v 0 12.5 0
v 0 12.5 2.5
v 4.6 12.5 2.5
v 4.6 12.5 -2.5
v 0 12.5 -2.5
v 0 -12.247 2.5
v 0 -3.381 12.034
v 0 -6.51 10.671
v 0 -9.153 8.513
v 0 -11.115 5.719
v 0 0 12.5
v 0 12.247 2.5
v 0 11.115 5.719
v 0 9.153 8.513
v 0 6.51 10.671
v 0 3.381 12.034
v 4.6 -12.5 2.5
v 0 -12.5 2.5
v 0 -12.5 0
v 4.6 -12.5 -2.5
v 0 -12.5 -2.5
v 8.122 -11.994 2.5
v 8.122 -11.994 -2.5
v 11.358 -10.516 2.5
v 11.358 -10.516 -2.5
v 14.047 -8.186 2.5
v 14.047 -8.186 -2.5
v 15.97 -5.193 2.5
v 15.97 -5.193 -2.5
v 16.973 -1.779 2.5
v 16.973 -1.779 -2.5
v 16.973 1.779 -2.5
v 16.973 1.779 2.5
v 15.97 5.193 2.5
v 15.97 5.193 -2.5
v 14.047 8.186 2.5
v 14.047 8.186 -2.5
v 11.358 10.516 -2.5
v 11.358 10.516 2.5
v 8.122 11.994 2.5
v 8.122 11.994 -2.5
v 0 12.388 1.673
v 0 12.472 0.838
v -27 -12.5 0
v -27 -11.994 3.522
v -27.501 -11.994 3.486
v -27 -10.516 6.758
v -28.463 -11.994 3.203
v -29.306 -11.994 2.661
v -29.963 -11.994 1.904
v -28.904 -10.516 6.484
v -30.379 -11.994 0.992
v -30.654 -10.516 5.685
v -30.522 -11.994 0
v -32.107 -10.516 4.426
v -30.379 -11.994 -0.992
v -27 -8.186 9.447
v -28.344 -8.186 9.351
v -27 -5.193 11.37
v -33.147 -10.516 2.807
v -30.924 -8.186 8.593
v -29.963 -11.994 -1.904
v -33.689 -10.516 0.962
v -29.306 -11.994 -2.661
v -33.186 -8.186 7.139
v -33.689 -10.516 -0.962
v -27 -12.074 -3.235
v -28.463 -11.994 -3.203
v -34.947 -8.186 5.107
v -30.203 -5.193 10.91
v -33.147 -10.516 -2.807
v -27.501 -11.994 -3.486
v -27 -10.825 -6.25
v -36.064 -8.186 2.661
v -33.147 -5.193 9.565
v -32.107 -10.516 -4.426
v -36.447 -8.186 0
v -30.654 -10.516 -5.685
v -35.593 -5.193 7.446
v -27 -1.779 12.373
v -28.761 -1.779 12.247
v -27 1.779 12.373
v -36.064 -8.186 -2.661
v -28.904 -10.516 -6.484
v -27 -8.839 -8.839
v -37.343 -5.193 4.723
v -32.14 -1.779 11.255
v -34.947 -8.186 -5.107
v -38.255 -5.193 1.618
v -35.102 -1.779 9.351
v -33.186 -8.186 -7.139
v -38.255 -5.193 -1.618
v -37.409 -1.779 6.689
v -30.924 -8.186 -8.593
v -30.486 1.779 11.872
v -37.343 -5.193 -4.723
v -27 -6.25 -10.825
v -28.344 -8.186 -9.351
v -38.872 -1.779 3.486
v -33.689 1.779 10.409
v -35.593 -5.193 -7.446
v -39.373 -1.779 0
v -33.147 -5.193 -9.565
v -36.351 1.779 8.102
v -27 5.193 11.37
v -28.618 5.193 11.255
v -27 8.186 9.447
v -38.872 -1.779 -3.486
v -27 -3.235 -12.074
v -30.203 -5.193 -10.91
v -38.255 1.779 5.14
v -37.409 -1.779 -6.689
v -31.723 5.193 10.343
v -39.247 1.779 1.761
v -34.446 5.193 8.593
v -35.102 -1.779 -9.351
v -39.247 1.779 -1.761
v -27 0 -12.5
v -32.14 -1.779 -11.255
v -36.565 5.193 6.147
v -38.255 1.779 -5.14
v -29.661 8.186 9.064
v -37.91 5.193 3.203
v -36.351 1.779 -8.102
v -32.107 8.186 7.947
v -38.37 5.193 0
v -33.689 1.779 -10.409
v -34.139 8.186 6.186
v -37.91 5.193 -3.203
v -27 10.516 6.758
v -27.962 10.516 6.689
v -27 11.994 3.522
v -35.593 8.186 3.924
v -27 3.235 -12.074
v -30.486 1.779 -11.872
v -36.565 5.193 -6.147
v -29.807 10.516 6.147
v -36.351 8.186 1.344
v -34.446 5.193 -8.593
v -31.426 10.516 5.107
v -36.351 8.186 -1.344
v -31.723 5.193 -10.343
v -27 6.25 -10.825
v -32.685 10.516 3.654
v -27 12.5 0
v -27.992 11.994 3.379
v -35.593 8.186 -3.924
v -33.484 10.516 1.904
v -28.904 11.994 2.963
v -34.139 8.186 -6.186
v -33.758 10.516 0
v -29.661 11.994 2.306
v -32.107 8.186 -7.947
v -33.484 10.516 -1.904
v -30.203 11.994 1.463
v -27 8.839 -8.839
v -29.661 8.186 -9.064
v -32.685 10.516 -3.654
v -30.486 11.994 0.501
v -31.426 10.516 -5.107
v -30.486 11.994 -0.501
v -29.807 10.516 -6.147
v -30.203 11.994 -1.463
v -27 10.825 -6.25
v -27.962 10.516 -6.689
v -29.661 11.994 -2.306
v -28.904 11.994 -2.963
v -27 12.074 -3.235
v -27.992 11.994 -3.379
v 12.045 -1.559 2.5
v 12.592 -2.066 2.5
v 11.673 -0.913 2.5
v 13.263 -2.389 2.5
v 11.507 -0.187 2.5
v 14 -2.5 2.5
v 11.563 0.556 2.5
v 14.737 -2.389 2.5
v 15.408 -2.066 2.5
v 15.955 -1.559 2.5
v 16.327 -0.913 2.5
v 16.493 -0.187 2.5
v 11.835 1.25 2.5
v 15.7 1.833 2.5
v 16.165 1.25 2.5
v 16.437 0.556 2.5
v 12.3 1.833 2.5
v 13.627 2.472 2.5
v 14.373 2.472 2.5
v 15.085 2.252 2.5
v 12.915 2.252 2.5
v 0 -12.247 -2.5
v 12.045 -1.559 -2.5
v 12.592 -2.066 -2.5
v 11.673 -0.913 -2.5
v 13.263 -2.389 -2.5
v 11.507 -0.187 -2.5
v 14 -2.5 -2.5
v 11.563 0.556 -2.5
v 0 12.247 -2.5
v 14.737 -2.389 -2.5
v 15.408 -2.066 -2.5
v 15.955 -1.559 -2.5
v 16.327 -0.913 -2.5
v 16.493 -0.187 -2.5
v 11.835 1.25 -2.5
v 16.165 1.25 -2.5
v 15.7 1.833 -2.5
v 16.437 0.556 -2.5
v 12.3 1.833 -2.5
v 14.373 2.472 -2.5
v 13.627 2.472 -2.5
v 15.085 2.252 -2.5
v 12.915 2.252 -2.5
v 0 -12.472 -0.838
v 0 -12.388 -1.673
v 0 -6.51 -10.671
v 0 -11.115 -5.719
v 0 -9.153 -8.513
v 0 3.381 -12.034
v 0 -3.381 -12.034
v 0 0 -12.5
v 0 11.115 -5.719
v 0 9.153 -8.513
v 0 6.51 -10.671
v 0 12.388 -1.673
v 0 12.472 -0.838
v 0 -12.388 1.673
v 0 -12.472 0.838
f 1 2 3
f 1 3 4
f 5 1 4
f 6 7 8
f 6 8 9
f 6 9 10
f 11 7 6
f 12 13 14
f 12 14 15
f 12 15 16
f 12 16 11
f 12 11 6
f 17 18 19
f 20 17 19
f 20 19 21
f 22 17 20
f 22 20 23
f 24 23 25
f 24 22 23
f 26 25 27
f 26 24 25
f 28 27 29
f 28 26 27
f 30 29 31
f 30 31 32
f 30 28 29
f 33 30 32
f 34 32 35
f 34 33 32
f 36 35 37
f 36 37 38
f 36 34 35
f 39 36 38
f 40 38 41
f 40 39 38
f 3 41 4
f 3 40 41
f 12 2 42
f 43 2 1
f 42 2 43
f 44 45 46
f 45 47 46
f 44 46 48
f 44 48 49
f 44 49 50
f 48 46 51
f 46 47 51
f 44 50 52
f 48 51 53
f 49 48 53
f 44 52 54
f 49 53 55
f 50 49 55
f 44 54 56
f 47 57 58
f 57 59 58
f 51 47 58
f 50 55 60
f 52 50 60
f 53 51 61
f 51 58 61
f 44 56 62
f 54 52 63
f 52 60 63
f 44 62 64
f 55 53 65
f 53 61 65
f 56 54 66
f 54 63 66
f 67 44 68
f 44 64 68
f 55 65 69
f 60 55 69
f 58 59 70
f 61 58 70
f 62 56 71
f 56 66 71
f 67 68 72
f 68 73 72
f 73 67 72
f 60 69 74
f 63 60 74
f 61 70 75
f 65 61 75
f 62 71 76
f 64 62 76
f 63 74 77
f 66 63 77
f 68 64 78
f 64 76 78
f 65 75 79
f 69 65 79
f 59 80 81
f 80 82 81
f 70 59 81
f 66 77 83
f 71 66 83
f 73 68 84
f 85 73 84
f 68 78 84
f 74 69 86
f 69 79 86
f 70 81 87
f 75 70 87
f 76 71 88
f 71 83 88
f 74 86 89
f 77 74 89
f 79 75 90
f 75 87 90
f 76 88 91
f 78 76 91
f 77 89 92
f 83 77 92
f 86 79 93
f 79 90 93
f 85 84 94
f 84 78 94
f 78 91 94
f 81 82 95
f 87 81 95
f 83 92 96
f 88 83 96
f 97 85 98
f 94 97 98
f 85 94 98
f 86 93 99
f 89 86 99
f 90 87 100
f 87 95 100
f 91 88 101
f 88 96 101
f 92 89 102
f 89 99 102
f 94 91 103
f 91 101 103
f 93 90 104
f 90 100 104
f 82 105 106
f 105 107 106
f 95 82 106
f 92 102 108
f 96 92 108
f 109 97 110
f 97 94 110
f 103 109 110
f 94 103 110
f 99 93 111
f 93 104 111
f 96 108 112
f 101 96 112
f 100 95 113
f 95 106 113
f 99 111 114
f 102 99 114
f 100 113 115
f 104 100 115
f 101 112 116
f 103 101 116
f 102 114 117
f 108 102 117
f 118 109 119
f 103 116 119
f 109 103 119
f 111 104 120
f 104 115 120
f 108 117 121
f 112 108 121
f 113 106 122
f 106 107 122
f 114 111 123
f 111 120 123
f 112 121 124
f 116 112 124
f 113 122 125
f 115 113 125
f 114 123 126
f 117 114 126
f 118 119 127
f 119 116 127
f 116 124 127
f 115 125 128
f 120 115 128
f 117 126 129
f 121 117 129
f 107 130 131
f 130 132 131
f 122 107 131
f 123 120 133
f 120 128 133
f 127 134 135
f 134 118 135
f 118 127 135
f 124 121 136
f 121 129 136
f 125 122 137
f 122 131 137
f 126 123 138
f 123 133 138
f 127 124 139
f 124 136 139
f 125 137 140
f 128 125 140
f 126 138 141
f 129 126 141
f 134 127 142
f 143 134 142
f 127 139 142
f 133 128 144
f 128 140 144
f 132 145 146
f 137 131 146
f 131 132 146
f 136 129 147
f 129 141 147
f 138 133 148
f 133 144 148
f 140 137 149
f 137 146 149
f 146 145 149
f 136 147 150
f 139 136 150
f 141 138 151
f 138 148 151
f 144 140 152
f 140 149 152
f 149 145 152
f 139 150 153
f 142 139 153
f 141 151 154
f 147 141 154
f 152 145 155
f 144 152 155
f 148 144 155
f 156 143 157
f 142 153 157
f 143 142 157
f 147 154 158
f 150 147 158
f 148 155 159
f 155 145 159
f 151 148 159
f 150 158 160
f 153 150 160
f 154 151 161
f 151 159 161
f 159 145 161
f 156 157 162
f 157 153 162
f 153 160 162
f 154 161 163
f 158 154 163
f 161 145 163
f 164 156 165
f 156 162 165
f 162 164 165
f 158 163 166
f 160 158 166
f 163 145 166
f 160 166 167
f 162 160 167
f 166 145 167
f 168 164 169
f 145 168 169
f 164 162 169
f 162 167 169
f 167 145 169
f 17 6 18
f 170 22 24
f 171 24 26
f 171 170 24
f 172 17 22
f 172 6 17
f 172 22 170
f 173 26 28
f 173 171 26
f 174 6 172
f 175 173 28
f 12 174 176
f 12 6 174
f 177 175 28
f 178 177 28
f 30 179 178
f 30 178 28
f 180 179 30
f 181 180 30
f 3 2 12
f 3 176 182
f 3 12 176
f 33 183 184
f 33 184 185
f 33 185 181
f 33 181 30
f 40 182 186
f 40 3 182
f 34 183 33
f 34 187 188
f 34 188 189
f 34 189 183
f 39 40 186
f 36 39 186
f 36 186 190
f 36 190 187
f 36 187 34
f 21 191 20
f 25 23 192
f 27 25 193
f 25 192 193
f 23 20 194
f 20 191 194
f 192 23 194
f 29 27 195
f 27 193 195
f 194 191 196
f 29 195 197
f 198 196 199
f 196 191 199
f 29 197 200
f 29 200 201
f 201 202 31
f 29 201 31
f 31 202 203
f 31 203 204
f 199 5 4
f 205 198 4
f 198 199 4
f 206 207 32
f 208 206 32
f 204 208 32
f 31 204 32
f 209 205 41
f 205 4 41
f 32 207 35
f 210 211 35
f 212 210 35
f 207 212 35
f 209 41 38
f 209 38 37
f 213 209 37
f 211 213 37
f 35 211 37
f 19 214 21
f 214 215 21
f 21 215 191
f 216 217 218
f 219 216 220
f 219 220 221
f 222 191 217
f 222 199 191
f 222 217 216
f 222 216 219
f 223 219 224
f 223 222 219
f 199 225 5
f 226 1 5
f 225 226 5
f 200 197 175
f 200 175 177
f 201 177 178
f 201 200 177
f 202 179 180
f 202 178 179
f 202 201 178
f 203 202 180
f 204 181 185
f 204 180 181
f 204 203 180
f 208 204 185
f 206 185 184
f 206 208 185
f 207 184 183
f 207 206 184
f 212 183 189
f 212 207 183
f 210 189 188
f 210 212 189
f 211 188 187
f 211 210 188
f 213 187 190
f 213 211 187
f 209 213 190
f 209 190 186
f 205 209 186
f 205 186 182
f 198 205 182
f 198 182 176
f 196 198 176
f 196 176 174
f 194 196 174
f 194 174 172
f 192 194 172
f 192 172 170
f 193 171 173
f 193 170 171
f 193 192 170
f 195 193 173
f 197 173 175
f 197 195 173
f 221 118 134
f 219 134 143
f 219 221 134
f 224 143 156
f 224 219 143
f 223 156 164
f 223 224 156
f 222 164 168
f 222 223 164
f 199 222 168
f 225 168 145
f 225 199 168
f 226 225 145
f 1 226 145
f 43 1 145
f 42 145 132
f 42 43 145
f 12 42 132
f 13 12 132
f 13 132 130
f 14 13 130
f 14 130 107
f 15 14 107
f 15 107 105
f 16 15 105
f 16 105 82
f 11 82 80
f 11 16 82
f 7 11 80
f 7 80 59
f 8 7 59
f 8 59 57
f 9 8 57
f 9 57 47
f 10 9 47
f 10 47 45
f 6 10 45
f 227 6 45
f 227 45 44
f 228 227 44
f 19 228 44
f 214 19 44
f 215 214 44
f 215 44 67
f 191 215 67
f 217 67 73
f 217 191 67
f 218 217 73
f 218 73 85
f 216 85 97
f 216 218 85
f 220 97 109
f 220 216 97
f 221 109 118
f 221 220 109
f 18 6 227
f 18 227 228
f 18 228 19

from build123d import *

# Parameters (mm, degrees)
SKETCH1_R               = 12.5
BOSS_EXTRUDE1_DEPTH     = 27
SKETCH6_W               = 5
SKETCH6_H               = 25
BOSS_EXTRUDE3_DEPTH     = 4.6
BOSS_EXTRUDE4_DEPTH     = 5
CUT_EXTRUDE1_DEPTH      = 34.320414163
CUT_EXTRUDE1_DEPTH_BACK = 34.320414163
SKETCH10_R              = 2.5
REVOLVE1_ANGLE          = 180


with BuildPart() as part:
    # Sketch1 → Boss-Extrude1 (new body)
    with BuildSketch(Plane(origin=(0, 0, 0), x_dir=(0, 0, -1), z_dir=(1, 0, 0))):
        Circle(SKETCH1_R)
    extrude(amount=-BOSS_EXTRUDE1_DEPTH)

    # Sketch6 → Boss-Extrude3 (add)
    with BuildSketch(Plane(origin=(0, 0, 0), x_dir=(0, 0, -1), z_dir=(1, 0, 0))):
        Rectangle(SKETCH6_W, SKETCH6_H)
    extrude(amount=BOSS_EXTRUDE3_DEPTH)

    # Sketch8 → Boss-Extrude4 (add)
    with BuildSketch(Plane.XY.offset(2.5)):
        with BuildLine():
            Line((4.6, 12.5), (4.6, -12.5))
            ThreePointArc((4.6, -12.5), (17.1, 0), (4.6, 12.5))
        make_face()
    extrude(amount=-BOSS_EXTRUDE4_DEPTH)

    # Sketch10 → Cut-Extrude1 (cut, two sides: drawn at the far end of the back side and taken through both)
    with BuildSketch(Plane.XY.offset(2.5).offset(-CUT_EXTRUDE1_DEPTH_BACK)):
        with Locations(Location((14, 0, 0), (0, 0, 270))):
            Circle(SKETCH10_R)
    extrude(amount=CUT_EXTRUDE1_DEPTH + CUT_EXTRUDE1_DEPTH_BACK, mode=Mode.SUBTRACT)

    # Sketch11 → Revolve1 (revolve)
    with BuildSketch(Plane.ZY.offset(27)):
        with BuildLine():
            Line((0, 12.5), (0, -12.5))
            ThreePointArc((0, -12.5), (12.5, 0), (0, 12.5))
        make_face()
    revolve(axis=Axis((-27, 12.5, 0), (0, -1, 0)), revolution_arc=REVOLVE1_ANGLE)


solid = part.part
